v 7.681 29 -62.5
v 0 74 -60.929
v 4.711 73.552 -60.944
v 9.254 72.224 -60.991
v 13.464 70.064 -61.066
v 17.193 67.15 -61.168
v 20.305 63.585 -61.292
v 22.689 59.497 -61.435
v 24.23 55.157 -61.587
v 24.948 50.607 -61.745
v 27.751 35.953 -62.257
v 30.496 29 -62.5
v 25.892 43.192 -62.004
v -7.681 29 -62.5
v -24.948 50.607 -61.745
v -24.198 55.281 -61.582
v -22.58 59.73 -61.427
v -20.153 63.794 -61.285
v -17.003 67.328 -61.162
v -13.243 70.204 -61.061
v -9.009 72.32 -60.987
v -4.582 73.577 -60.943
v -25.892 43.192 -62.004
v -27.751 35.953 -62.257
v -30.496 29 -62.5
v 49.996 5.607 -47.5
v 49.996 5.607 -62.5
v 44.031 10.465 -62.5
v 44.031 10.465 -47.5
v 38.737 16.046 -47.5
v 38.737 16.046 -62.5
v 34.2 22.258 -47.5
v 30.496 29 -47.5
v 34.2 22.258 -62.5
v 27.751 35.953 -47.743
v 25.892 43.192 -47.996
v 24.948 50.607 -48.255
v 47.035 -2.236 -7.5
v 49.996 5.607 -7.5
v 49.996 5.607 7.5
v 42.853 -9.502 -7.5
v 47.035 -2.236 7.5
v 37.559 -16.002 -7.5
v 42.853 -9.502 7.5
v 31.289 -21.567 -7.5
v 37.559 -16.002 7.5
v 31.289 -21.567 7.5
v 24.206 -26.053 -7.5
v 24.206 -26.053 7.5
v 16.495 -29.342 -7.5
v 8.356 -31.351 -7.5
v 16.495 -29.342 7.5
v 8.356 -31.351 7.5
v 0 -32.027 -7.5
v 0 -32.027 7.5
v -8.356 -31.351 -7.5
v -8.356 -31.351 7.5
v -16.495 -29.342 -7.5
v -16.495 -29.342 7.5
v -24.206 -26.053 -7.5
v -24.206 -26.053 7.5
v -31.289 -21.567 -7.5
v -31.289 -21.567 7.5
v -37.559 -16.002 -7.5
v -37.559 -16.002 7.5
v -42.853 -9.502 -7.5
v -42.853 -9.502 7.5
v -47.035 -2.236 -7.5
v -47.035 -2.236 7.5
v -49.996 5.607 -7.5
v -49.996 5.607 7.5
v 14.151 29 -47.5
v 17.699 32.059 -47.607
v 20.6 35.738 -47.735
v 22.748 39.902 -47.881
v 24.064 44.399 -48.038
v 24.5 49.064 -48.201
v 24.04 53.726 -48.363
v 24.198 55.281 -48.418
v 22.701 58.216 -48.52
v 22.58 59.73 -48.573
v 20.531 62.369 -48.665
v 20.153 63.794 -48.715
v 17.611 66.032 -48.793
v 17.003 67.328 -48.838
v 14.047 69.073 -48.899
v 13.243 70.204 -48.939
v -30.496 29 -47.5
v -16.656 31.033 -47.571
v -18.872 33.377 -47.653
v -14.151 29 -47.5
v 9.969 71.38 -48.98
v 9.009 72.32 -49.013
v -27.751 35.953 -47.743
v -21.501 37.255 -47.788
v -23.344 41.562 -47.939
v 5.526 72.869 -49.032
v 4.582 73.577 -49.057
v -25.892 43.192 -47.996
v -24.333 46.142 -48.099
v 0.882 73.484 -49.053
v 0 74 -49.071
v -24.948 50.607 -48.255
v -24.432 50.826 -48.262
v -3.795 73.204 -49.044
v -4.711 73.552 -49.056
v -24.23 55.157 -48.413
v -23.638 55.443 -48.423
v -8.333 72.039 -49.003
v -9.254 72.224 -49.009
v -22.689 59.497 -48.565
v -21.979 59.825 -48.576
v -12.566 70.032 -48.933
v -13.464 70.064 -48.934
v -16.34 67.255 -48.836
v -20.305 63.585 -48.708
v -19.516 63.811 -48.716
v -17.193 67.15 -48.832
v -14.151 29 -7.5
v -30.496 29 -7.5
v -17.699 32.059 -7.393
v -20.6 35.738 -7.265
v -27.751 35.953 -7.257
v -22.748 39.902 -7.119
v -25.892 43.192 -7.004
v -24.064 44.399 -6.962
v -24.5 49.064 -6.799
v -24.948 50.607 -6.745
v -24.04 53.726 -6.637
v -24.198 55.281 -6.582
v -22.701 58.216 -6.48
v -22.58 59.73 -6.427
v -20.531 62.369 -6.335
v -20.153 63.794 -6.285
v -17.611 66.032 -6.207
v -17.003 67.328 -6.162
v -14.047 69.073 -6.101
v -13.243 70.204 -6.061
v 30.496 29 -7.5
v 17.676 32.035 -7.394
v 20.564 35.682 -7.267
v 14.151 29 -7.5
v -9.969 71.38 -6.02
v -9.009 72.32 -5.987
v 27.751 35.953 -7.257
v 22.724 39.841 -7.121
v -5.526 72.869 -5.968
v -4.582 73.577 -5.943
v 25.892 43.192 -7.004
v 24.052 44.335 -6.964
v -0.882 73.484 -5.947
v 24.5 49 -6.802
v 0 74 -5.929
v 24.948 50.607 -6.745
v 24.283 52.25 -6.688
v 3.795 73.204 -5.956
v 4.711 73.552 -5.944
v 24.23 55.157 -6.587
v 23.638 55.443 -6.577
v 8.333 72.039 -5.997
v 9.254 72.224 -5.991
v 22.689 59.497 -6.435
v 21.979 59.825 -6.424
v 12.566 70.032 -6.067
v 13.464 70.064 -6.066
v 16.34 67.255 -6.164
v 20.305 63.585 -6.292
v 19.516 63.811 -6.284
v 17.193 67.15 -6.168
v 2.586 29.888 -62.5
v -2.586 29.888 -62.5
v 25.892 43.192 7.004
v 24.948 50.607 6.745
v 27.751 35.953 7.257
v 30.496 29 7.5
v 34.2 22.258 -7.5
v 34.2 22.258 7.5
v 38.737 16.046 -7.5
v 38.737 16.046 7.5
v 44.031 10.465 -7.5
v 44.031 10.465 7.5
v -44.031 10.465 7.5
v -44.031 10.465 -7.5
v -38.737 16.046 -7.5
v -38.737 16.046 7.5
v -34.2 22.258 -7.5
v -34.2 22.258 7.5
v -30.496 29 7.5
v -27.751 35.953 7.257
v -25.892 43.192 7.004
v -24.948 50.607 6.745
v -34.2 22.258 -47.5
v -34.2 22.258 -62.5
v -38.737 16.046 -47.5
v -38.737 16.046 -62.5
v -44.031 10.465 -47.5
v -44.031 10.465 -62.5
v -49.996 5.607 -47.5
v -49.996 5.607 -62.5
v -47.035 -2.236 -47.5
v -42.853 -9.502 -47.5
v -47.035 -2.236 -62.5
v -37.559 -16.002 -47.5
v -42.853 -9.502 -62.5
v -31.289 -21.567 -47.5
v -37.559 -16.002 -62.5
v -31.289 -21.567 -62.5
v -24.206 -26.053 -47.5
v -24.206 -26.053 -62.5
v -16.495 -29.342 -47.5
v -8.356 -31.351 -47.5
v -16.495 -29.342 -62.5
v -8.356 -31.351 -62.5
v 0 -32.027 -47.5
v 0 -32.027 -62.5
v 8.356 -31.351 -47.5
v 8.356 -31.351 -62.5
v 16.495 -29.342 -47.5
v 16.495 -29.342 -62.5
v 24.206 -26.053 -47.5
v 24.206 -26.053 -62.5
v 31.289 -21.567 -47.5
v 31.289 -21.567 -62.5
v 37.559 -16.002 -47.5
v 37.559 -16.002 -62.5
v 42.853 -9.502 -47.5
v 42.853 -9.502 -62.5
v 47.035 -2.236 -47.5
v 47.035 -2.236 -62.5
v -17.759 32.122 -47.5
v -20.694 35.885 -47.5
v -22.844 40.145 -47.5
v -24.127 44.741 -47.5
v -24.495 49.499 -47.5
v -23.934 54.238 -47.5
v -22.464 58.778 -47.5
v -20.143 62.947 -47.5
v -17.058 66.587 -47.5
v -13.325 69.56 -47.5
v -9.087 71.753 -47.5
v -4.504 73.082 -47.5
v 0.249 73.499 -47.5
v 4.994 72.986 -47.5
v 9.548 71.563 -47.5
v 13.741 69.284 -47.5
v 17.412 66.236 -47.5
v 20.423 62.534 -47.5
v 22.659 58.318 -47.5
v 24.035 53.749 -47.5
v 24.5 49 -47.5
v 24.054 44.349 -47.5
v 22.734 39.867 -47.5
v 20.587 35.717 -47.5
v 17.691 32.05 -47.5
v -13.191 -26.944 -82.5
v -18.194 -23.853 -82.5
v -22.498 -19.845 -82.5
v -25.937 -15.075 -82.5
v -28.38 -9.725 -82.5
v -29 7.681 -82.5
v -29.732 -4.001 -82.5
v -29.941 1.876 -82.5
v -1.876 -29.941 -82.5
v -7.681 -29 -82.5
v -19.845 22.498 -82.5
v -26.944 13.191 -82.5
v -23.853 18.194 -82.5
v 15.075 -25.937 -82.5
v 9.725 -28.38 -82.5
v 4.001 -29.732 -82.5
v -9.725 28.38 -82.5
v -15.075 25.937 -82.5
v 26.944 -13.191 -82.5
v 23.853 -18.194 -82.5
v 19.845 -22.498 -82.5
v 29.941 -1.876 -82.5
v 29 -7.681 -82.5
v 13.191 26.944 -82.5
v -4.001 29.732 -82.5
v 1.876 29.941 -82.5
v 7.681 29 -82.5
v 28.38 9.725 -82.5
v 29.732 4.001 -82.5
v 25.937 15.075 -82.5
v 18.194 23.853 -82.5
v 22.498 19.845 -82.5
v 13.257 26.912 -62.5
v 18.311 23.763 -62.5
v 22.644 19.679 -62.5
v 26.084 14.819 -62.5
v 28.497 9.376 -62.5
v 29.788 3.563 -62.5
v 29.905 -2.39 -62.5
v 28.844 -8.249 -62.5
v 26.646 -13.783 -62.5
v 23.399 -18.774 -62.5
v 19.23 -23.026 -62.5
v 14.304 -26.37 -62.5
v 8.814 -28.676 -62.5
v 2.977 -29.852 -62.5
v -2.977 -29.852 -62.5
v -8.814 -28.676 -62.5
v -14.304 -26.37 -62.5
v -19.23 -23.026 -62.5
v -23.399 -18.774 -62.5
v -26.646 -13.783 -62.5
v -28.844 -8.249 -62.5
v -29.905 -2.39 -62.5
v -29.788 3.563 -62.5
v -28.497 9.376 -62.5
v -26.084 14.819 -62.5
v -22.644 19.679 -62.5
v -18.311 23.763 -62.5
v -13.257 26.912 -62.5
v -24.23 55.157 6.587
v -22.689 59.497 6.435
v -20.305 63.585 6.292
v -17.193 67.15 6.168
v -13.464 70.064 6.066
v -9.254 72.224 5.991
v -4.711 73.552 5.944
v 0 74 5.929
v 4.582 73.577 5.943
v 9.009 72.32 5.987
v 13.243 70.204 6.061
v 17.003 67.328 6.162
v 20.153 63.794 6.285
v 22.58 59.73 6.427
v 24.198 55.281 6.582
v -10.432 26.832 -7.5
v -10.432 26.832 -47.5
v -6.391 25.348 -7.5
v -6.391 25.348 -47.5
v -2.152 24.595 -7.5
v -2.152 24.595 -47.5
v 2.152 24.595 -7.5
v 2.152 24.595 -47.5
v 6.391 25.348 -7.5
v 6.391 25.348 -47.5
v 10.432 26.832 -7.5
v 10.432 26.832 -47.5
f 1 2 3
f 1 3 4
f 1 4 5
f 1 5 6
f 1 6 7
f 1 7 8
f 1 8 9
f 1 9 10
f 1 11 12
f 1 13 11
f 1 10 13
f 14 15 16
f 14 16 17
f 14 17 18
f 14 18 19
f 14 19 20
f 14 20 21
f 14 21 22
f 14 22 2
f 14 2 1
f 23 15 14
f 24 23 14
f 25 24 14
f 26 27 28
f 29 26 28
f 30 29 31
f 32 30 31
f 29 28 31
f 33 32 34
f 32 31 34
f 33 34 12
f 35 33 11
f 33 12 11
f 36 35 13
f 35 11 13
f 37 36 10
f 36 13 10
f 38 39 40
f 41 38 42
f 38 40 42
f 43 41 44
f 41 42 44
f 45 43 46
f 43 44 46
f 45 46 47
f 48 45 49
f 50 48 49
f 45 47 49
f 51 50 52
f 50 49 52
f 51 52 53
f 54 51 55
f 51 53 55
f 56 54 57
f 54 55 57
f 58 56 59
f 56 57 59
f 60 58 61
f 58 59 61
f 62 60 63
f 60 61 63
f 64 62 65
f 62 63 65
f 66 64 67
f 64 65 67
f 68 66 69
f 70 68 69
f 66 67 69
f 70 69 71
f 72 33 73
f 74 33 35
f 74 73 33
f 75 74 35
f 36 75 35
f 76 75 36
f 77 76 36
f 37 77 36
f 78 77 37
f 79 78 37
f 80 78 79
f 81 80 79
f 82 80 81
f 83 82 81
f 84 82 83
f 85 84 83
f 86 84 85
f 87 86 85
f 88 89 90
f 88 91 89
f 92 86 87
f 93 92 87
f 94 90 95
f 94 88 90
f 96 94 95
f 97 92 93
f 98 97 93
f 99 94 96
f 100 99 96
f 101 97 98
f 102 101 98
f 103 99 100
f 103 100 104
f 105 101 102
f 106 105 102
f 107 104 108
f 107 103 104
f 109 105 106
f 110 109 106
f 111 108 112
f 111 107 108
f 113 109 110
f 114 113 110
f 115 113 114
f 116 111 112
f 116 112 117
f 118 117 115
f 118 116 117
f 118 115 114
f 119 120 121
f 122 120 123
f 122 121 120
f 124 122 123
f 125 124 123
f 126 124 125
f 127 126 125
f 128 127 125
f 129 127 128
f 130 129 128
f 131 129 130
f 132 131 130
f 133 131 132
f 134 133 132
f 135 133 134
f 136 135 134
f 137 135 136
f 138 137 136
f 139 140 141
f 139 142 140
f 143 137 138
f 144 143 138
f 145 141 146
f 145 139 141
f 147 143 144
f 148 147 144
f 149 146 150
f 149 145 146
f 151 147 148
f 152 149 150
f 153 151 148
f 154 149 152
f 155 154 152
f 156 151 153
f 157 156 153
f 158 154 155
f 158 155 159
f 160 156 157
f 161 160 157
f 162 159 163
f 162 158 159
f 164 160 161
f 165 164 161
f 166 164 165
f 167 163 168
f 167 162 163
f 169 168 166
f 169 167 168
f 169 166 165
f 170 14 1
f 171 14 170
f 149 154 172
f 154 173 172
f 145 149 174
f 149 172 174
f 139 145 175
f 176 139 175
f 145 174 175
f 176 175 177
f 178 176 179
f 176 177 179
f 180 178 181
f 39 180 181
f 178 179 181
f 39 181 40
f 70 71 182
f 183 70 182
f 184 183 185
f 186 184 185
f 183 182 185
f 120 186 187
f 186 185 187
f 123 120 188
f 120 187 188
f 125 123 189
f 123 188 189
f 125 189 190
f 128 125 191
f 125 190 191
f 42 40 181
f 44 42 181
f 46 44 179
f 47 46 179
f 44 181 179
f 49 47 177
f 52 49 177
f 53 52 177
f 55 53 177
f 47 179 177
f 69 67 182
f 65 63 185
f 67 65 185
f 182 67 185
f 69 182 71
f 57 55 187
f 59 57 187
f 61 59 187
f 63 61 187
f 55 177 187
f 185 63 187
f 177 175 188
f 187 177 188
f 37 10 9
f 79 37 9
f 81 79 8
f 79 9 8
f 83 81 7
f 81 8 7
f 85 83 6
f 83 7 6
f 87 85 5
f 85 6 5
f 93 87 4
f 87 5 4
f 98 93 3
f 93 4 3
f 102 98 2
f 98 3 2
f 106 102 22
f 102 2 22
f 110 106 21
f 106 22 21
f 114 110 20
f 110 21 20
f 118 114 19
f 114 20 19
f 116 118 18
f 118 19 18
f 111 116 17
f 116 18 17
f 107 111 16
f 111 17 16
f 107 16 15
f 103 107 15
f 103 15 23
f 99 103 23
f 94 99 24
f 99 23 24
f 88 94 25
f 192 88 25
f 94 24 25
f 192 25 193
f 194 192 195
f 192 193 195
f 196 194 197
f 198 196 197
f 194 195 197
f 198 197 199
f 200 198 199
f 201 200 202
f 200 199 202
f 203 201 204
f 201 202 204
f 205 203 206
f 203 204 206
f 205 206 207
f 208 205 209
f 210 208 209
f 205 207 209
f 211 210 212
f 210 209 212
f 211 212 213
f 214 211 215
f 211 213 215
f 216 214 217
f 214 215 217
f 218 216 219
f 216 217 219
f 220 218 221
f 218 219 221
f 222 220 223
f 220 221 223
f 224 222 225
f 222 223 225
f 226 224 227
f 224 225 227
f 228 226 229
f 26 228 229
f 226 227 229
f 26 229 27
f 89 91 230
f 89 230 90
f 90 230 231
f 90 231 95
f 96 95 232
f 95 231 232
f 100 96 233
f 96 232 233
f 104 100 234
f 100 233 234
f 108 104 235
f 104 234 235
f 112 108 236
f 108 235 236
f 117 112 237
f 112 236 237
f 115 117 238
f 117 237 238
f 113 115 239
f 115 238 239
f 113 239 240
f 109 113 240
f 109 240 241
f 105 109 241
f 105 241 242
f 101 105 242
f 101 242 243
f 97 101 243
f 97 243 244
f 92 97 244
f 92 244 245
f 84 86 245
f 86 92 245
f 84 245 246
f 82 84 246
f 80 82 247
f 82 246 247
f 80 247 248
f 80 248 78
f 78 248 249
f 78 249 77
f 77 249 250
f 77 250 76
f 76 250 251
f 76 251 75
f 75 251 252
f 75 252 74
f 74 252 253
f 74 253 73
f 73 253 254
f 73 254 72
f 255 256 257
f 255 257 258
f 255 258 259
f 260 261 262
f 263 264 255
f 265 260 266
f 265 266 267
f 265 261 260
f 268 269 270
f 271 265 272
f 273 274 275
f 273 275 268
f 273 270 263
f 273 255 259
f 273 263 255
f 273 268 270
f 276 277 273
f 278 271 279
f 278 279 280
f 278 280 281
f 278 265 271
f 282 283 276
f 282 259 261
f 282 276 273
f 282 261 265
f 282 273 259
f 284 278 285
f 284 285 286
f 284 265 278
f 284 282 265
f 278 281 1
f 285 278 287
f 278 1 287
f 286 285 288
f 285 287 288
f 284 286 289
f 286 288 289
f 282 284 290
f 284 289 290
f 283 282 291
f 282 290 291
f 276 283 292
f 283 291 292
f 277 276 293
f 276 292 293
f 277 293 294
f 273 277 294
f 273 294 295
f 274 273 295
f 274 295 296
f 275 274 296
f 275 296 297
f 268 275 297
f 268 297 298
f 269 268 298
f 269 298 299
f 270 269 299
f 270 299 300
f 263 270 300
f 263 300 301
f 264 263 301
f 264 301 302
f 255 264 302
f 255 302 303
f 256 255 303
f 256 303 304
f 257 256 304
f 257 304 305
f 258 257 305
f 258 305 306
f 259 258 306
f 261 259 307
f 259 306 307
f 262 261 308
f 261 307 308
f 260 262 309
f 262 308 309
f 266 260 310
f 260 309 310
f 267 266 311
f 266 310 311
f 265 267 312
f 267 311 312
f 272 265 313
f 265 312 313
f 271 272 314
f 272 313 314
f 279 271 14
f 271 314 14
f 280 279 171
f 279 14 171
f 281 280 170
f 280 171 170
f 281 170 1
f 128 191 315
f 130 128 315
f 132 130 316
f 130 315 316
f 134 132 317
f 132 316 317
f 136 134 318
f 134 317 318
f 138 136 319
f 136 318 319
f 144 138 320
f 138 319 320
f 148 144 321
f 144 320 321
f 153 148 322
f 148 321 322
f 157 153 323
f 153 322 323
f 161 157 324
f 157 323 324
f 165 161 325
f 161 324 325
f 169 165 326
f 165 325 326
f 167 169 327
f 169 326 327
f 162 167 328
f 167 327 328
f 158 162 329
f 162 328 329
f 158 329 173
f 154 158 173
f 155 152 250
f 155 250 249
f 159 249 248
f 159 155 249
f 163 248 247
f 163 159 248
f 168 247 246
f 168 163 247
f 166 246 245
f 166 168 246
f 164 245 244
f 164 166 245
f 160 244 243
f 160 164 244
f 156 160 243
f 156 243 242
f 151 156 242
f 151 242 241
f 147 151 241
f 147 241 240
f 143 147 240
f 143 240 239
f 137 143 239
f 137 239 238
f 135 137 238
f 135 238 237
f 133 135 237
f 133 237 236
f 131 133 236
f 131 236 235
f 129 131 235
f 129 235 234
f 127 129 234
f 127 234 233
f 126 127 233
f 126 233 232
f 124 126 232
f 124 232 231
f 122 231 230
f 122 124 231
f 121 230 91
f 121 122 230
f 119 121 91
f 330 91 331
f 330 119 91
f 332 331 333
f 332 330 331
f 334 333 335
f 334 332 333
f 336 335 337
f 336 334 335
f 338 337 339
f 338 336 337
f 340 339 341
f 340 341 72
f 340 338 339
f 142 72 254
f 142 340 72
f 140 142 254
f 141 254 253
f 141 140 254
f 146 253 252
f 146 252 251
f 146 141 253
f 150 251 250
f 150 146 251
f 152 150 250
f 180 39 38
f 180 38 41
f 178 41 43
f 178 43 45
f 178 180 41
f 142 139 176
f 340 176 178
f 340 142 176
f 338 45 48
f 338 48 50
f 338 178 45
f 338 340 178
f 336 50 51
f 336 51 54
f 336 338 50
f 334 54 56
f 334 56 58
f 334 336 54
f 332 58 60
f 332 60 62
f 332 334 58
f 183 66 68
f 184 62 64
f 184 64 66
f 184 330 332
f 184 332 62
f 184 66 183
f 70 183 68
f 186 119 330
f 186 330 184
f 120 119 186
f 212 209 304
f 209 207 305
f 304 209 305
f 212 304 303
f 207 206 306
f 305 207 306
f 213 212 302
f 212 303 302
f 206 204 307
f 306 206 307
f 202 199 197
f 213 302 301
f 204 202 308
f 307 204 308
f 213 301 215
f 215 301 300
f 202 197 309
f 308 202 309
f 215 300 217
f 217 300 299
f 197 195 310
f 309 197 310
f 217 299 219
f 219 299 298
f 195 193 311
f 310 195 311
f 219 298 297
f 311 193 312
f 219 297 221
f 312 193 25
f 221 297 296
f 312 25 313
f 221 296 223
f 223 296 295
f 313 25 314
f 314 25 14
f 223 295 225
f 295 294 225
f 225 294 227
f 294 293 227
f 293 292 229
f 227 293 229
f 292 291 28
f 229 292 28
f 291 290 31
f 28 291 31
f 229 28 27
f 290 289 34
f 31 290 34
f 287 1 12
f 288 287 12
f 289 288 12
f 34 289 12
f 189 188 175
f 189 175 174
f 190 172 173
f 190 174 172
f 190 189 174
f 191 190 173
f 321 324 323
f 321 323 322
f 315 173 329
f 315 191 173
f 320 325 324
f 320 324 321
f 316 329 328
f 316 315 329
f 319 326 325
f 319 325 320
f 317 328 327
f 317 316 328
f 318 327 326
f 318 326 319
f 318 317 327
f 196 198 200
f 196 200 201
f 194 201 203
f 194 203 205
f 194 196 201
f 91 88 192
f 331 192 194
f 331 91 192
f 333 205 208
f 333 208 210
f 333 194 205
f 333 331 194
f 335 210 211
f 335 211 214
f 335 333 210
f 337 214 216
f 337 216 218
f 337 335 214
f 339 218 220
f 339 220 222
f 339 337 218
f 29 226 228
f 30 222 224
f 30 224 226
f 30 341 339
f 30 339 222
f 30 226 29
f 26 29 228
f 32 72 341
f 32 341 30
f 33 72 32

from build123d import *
from build123d.topology import SkipClean

# Parameters (mm, degrees)
BOSS_EXTRUDE1_DEPTH   = 7.5
CUT_EXTRUDE1_DEPTH    = 90.620722002
SKETCH4_R             = 24.5
BOSS_EXTRUDE3_DEPTH   = 50
LPATTERN6_START       = -60.928565373
LPATTERN6_DEPTH       = 11.857130746
LPATTERN6_START_2     = -62.5
LPATTERN6_2_OUTLINE_R = 24.5
LPATTERN6_2_DEPTH     = 15
LPATTERN6_3_OUTLINE_R = 24.5
LPATTERN6_3_DEPTH     = 1.571434627
LPATTERN6_START_3     = -49.996237981
LPATTERN6_4_DEPTH     = 99.992475962
BOSS_EXTRUDE5_DEPTH   = 10
SKETCH8_R             = 30
BOSS_EXTRUDE7_DEPTH   = 20


with BuildPart() as part:
    # Sketch1 → Boss-Extrude1 (new, symmetric)
    with BuildSketch(Plane.XY):
        with BuildLine():
            ThreePointArc((-24.948290112, 50.607115575), (0, 74), (24.948290112, 50.607115575))
            ThreePointArc((24.948290112, 50.607115575), (32.398481343, 25.282941249), (49.996237981, 5.607115575))
            ThreePointArc((49.996237981, 5.607115575), (0, -32.02671366), (-49.996237981, 5.607115575))
            ThreePointArc((-49.996237981, 5.607115575), (-32.398481343, 25.282941249), (-24.948290112, 50.607115575))
        make_face()
    extrude(amount=BOSS_EXTRUDE1_DEPTH, both=True)

    # Sketch2 → Cut-Extrude1 (cut, symmetric)
    with BuildSketch(Plane(origin=(0, 0, 0), x_dir=(0, 0, -1), z_dir=(1, 0, 0))):
        Polygon((-7.5, 29), (-5.928565373, 74), (-7.5, 74), align=None)
        Polygon((7.5, 74), (7.5, 29), (5.928565373, 74), align=None)
    extrude(amount=CUT_EXTRUDE1_DEPTH, both=True, mode=Mode.SUBTRACT)

    # Sketch4 → Boss-Extrude3 (add)
    with BuildSketch(Plane.XY):
        with Locations((0, 49)):
            Circle(SKETCH4_R)
    extrude(amount=-BOSS_EXTRUDE3_DEPTH)

    # LPattern6: read off the stored shape, not the designer's step
    # LPattern6 outline → LPattern6 (add)
    with BuildSketch(Plane.XY.offset(LPATTERN6_START)):
        with BuildLine():
            ThreePointArc((-49.996237981, 5.607115575), (0, -32.02671366), (49.996237981, 5.607115575))
            ThreePointArc((49.996237981, 5.607115575), (32.398481343, 25.282941249), (24.948290112, 50.607115575))
            ThreePointArc((24.948290112, 50.607115575), (0, 74), (-24.948290112, 50.607115575))
            ThreePointArc((-24.948290112, 50.607115575), (-32.398481343, 25.282941249), (-49.996237981, 5.607115575))
        make_face()
    extrude(amount=LPATTERN6_DEPTH)

    # LPattern6 2 outline → LPattern6 2 (add)
    with BuildSketch(Plane.XY.offset(LPATTERN6_START_2)):
        with BuildLine():
            ThreePointArc((-49.996237981, 5.607115575), (0, -32.02671366), (49.996237981, 5.607115575))
            ThreePointArc((49.996237981, 5.607115575), (32.398481343, 25.282941249), (24.948290112, 50.607115575))
            ThreePointArc((24.948290112, 50.607115575), (0, 74), (-24.948290112, 50.607115575))
            ThreePointArc((-24.948290112, 50.607115575), (-32.398481343, 25.282941249), (-49.996237981, 5.607115575))
        make_face()
        with Locations((0, 49)):
            Circle(LPATTERN6_2_OUTLINE_R, mode=Mode.SUBTRACT)
    extrude(amount=LPATTERN6_2_DEPTH)

    # LPattern6 3 outline → LPattern6 3 (add)
    with BuildSketch(Plane.XY.offset(LPATTERN6_START_2)):
        with Locations((0, 49)):
            Circle(LPATTERN6_3_OUTLINE_R)
    extrude(amount=LPATTERN6_3_DEPTH)

    # LPattern6 4 outline → LPattern6 4 (cut)
    with BuildSketch(Plane.YZ.offset(LPATTERN6_START_3)):
        Polygon((75, -60.893644604), (74, -60.928565373), (29, -62.5), (75, -62.5), align=None)
        Polygon((74, -49.071434627), (75, -49.106355396), (75, -47.5), (29, -47.5), align=None)
    extrude(amount=LPATTERN6_4_DEPTH, mode=Mode.SUBTRACT)

    # Sketch5 → Boss-Extrude5 (add)
    with SkipClean():  # the faces are left unmerged after this step: merging them gives an invalid solid
        with BuildSketch(Plane(origin=(0, 0, -47.5), x_dir=(-1, 0, 0), z_dir=(0, 0, -1))):
            with BuildLine():
                Line((-14.150971698, 29), (14.150971698, 29))
                ThreePointArc((14.150971698, 29), (0, 73.5), (-14.150971698, 29))
            make_face()
        extrude(amount=BOSS_EXTRUDE5_DEPTH)

    # Sketch8 → Boss-Extrude7 (add)
    with SkipClean():  # the faces are left unmerged after this step: merging them gives an invalid solid
        with BuildSketch(Plane(origin=(0, 0, -62.5), x_dir=(-1, 0, 0), z_dir=(0, 0, -1))):
            with Locations(Location((0, 0, 0), (0, 0, 104.835111582))):
                Circle(SKETCH8_R)
        extrude(amount=BOSS_EXTRUDE7_DEPTH)


solid = part.part
